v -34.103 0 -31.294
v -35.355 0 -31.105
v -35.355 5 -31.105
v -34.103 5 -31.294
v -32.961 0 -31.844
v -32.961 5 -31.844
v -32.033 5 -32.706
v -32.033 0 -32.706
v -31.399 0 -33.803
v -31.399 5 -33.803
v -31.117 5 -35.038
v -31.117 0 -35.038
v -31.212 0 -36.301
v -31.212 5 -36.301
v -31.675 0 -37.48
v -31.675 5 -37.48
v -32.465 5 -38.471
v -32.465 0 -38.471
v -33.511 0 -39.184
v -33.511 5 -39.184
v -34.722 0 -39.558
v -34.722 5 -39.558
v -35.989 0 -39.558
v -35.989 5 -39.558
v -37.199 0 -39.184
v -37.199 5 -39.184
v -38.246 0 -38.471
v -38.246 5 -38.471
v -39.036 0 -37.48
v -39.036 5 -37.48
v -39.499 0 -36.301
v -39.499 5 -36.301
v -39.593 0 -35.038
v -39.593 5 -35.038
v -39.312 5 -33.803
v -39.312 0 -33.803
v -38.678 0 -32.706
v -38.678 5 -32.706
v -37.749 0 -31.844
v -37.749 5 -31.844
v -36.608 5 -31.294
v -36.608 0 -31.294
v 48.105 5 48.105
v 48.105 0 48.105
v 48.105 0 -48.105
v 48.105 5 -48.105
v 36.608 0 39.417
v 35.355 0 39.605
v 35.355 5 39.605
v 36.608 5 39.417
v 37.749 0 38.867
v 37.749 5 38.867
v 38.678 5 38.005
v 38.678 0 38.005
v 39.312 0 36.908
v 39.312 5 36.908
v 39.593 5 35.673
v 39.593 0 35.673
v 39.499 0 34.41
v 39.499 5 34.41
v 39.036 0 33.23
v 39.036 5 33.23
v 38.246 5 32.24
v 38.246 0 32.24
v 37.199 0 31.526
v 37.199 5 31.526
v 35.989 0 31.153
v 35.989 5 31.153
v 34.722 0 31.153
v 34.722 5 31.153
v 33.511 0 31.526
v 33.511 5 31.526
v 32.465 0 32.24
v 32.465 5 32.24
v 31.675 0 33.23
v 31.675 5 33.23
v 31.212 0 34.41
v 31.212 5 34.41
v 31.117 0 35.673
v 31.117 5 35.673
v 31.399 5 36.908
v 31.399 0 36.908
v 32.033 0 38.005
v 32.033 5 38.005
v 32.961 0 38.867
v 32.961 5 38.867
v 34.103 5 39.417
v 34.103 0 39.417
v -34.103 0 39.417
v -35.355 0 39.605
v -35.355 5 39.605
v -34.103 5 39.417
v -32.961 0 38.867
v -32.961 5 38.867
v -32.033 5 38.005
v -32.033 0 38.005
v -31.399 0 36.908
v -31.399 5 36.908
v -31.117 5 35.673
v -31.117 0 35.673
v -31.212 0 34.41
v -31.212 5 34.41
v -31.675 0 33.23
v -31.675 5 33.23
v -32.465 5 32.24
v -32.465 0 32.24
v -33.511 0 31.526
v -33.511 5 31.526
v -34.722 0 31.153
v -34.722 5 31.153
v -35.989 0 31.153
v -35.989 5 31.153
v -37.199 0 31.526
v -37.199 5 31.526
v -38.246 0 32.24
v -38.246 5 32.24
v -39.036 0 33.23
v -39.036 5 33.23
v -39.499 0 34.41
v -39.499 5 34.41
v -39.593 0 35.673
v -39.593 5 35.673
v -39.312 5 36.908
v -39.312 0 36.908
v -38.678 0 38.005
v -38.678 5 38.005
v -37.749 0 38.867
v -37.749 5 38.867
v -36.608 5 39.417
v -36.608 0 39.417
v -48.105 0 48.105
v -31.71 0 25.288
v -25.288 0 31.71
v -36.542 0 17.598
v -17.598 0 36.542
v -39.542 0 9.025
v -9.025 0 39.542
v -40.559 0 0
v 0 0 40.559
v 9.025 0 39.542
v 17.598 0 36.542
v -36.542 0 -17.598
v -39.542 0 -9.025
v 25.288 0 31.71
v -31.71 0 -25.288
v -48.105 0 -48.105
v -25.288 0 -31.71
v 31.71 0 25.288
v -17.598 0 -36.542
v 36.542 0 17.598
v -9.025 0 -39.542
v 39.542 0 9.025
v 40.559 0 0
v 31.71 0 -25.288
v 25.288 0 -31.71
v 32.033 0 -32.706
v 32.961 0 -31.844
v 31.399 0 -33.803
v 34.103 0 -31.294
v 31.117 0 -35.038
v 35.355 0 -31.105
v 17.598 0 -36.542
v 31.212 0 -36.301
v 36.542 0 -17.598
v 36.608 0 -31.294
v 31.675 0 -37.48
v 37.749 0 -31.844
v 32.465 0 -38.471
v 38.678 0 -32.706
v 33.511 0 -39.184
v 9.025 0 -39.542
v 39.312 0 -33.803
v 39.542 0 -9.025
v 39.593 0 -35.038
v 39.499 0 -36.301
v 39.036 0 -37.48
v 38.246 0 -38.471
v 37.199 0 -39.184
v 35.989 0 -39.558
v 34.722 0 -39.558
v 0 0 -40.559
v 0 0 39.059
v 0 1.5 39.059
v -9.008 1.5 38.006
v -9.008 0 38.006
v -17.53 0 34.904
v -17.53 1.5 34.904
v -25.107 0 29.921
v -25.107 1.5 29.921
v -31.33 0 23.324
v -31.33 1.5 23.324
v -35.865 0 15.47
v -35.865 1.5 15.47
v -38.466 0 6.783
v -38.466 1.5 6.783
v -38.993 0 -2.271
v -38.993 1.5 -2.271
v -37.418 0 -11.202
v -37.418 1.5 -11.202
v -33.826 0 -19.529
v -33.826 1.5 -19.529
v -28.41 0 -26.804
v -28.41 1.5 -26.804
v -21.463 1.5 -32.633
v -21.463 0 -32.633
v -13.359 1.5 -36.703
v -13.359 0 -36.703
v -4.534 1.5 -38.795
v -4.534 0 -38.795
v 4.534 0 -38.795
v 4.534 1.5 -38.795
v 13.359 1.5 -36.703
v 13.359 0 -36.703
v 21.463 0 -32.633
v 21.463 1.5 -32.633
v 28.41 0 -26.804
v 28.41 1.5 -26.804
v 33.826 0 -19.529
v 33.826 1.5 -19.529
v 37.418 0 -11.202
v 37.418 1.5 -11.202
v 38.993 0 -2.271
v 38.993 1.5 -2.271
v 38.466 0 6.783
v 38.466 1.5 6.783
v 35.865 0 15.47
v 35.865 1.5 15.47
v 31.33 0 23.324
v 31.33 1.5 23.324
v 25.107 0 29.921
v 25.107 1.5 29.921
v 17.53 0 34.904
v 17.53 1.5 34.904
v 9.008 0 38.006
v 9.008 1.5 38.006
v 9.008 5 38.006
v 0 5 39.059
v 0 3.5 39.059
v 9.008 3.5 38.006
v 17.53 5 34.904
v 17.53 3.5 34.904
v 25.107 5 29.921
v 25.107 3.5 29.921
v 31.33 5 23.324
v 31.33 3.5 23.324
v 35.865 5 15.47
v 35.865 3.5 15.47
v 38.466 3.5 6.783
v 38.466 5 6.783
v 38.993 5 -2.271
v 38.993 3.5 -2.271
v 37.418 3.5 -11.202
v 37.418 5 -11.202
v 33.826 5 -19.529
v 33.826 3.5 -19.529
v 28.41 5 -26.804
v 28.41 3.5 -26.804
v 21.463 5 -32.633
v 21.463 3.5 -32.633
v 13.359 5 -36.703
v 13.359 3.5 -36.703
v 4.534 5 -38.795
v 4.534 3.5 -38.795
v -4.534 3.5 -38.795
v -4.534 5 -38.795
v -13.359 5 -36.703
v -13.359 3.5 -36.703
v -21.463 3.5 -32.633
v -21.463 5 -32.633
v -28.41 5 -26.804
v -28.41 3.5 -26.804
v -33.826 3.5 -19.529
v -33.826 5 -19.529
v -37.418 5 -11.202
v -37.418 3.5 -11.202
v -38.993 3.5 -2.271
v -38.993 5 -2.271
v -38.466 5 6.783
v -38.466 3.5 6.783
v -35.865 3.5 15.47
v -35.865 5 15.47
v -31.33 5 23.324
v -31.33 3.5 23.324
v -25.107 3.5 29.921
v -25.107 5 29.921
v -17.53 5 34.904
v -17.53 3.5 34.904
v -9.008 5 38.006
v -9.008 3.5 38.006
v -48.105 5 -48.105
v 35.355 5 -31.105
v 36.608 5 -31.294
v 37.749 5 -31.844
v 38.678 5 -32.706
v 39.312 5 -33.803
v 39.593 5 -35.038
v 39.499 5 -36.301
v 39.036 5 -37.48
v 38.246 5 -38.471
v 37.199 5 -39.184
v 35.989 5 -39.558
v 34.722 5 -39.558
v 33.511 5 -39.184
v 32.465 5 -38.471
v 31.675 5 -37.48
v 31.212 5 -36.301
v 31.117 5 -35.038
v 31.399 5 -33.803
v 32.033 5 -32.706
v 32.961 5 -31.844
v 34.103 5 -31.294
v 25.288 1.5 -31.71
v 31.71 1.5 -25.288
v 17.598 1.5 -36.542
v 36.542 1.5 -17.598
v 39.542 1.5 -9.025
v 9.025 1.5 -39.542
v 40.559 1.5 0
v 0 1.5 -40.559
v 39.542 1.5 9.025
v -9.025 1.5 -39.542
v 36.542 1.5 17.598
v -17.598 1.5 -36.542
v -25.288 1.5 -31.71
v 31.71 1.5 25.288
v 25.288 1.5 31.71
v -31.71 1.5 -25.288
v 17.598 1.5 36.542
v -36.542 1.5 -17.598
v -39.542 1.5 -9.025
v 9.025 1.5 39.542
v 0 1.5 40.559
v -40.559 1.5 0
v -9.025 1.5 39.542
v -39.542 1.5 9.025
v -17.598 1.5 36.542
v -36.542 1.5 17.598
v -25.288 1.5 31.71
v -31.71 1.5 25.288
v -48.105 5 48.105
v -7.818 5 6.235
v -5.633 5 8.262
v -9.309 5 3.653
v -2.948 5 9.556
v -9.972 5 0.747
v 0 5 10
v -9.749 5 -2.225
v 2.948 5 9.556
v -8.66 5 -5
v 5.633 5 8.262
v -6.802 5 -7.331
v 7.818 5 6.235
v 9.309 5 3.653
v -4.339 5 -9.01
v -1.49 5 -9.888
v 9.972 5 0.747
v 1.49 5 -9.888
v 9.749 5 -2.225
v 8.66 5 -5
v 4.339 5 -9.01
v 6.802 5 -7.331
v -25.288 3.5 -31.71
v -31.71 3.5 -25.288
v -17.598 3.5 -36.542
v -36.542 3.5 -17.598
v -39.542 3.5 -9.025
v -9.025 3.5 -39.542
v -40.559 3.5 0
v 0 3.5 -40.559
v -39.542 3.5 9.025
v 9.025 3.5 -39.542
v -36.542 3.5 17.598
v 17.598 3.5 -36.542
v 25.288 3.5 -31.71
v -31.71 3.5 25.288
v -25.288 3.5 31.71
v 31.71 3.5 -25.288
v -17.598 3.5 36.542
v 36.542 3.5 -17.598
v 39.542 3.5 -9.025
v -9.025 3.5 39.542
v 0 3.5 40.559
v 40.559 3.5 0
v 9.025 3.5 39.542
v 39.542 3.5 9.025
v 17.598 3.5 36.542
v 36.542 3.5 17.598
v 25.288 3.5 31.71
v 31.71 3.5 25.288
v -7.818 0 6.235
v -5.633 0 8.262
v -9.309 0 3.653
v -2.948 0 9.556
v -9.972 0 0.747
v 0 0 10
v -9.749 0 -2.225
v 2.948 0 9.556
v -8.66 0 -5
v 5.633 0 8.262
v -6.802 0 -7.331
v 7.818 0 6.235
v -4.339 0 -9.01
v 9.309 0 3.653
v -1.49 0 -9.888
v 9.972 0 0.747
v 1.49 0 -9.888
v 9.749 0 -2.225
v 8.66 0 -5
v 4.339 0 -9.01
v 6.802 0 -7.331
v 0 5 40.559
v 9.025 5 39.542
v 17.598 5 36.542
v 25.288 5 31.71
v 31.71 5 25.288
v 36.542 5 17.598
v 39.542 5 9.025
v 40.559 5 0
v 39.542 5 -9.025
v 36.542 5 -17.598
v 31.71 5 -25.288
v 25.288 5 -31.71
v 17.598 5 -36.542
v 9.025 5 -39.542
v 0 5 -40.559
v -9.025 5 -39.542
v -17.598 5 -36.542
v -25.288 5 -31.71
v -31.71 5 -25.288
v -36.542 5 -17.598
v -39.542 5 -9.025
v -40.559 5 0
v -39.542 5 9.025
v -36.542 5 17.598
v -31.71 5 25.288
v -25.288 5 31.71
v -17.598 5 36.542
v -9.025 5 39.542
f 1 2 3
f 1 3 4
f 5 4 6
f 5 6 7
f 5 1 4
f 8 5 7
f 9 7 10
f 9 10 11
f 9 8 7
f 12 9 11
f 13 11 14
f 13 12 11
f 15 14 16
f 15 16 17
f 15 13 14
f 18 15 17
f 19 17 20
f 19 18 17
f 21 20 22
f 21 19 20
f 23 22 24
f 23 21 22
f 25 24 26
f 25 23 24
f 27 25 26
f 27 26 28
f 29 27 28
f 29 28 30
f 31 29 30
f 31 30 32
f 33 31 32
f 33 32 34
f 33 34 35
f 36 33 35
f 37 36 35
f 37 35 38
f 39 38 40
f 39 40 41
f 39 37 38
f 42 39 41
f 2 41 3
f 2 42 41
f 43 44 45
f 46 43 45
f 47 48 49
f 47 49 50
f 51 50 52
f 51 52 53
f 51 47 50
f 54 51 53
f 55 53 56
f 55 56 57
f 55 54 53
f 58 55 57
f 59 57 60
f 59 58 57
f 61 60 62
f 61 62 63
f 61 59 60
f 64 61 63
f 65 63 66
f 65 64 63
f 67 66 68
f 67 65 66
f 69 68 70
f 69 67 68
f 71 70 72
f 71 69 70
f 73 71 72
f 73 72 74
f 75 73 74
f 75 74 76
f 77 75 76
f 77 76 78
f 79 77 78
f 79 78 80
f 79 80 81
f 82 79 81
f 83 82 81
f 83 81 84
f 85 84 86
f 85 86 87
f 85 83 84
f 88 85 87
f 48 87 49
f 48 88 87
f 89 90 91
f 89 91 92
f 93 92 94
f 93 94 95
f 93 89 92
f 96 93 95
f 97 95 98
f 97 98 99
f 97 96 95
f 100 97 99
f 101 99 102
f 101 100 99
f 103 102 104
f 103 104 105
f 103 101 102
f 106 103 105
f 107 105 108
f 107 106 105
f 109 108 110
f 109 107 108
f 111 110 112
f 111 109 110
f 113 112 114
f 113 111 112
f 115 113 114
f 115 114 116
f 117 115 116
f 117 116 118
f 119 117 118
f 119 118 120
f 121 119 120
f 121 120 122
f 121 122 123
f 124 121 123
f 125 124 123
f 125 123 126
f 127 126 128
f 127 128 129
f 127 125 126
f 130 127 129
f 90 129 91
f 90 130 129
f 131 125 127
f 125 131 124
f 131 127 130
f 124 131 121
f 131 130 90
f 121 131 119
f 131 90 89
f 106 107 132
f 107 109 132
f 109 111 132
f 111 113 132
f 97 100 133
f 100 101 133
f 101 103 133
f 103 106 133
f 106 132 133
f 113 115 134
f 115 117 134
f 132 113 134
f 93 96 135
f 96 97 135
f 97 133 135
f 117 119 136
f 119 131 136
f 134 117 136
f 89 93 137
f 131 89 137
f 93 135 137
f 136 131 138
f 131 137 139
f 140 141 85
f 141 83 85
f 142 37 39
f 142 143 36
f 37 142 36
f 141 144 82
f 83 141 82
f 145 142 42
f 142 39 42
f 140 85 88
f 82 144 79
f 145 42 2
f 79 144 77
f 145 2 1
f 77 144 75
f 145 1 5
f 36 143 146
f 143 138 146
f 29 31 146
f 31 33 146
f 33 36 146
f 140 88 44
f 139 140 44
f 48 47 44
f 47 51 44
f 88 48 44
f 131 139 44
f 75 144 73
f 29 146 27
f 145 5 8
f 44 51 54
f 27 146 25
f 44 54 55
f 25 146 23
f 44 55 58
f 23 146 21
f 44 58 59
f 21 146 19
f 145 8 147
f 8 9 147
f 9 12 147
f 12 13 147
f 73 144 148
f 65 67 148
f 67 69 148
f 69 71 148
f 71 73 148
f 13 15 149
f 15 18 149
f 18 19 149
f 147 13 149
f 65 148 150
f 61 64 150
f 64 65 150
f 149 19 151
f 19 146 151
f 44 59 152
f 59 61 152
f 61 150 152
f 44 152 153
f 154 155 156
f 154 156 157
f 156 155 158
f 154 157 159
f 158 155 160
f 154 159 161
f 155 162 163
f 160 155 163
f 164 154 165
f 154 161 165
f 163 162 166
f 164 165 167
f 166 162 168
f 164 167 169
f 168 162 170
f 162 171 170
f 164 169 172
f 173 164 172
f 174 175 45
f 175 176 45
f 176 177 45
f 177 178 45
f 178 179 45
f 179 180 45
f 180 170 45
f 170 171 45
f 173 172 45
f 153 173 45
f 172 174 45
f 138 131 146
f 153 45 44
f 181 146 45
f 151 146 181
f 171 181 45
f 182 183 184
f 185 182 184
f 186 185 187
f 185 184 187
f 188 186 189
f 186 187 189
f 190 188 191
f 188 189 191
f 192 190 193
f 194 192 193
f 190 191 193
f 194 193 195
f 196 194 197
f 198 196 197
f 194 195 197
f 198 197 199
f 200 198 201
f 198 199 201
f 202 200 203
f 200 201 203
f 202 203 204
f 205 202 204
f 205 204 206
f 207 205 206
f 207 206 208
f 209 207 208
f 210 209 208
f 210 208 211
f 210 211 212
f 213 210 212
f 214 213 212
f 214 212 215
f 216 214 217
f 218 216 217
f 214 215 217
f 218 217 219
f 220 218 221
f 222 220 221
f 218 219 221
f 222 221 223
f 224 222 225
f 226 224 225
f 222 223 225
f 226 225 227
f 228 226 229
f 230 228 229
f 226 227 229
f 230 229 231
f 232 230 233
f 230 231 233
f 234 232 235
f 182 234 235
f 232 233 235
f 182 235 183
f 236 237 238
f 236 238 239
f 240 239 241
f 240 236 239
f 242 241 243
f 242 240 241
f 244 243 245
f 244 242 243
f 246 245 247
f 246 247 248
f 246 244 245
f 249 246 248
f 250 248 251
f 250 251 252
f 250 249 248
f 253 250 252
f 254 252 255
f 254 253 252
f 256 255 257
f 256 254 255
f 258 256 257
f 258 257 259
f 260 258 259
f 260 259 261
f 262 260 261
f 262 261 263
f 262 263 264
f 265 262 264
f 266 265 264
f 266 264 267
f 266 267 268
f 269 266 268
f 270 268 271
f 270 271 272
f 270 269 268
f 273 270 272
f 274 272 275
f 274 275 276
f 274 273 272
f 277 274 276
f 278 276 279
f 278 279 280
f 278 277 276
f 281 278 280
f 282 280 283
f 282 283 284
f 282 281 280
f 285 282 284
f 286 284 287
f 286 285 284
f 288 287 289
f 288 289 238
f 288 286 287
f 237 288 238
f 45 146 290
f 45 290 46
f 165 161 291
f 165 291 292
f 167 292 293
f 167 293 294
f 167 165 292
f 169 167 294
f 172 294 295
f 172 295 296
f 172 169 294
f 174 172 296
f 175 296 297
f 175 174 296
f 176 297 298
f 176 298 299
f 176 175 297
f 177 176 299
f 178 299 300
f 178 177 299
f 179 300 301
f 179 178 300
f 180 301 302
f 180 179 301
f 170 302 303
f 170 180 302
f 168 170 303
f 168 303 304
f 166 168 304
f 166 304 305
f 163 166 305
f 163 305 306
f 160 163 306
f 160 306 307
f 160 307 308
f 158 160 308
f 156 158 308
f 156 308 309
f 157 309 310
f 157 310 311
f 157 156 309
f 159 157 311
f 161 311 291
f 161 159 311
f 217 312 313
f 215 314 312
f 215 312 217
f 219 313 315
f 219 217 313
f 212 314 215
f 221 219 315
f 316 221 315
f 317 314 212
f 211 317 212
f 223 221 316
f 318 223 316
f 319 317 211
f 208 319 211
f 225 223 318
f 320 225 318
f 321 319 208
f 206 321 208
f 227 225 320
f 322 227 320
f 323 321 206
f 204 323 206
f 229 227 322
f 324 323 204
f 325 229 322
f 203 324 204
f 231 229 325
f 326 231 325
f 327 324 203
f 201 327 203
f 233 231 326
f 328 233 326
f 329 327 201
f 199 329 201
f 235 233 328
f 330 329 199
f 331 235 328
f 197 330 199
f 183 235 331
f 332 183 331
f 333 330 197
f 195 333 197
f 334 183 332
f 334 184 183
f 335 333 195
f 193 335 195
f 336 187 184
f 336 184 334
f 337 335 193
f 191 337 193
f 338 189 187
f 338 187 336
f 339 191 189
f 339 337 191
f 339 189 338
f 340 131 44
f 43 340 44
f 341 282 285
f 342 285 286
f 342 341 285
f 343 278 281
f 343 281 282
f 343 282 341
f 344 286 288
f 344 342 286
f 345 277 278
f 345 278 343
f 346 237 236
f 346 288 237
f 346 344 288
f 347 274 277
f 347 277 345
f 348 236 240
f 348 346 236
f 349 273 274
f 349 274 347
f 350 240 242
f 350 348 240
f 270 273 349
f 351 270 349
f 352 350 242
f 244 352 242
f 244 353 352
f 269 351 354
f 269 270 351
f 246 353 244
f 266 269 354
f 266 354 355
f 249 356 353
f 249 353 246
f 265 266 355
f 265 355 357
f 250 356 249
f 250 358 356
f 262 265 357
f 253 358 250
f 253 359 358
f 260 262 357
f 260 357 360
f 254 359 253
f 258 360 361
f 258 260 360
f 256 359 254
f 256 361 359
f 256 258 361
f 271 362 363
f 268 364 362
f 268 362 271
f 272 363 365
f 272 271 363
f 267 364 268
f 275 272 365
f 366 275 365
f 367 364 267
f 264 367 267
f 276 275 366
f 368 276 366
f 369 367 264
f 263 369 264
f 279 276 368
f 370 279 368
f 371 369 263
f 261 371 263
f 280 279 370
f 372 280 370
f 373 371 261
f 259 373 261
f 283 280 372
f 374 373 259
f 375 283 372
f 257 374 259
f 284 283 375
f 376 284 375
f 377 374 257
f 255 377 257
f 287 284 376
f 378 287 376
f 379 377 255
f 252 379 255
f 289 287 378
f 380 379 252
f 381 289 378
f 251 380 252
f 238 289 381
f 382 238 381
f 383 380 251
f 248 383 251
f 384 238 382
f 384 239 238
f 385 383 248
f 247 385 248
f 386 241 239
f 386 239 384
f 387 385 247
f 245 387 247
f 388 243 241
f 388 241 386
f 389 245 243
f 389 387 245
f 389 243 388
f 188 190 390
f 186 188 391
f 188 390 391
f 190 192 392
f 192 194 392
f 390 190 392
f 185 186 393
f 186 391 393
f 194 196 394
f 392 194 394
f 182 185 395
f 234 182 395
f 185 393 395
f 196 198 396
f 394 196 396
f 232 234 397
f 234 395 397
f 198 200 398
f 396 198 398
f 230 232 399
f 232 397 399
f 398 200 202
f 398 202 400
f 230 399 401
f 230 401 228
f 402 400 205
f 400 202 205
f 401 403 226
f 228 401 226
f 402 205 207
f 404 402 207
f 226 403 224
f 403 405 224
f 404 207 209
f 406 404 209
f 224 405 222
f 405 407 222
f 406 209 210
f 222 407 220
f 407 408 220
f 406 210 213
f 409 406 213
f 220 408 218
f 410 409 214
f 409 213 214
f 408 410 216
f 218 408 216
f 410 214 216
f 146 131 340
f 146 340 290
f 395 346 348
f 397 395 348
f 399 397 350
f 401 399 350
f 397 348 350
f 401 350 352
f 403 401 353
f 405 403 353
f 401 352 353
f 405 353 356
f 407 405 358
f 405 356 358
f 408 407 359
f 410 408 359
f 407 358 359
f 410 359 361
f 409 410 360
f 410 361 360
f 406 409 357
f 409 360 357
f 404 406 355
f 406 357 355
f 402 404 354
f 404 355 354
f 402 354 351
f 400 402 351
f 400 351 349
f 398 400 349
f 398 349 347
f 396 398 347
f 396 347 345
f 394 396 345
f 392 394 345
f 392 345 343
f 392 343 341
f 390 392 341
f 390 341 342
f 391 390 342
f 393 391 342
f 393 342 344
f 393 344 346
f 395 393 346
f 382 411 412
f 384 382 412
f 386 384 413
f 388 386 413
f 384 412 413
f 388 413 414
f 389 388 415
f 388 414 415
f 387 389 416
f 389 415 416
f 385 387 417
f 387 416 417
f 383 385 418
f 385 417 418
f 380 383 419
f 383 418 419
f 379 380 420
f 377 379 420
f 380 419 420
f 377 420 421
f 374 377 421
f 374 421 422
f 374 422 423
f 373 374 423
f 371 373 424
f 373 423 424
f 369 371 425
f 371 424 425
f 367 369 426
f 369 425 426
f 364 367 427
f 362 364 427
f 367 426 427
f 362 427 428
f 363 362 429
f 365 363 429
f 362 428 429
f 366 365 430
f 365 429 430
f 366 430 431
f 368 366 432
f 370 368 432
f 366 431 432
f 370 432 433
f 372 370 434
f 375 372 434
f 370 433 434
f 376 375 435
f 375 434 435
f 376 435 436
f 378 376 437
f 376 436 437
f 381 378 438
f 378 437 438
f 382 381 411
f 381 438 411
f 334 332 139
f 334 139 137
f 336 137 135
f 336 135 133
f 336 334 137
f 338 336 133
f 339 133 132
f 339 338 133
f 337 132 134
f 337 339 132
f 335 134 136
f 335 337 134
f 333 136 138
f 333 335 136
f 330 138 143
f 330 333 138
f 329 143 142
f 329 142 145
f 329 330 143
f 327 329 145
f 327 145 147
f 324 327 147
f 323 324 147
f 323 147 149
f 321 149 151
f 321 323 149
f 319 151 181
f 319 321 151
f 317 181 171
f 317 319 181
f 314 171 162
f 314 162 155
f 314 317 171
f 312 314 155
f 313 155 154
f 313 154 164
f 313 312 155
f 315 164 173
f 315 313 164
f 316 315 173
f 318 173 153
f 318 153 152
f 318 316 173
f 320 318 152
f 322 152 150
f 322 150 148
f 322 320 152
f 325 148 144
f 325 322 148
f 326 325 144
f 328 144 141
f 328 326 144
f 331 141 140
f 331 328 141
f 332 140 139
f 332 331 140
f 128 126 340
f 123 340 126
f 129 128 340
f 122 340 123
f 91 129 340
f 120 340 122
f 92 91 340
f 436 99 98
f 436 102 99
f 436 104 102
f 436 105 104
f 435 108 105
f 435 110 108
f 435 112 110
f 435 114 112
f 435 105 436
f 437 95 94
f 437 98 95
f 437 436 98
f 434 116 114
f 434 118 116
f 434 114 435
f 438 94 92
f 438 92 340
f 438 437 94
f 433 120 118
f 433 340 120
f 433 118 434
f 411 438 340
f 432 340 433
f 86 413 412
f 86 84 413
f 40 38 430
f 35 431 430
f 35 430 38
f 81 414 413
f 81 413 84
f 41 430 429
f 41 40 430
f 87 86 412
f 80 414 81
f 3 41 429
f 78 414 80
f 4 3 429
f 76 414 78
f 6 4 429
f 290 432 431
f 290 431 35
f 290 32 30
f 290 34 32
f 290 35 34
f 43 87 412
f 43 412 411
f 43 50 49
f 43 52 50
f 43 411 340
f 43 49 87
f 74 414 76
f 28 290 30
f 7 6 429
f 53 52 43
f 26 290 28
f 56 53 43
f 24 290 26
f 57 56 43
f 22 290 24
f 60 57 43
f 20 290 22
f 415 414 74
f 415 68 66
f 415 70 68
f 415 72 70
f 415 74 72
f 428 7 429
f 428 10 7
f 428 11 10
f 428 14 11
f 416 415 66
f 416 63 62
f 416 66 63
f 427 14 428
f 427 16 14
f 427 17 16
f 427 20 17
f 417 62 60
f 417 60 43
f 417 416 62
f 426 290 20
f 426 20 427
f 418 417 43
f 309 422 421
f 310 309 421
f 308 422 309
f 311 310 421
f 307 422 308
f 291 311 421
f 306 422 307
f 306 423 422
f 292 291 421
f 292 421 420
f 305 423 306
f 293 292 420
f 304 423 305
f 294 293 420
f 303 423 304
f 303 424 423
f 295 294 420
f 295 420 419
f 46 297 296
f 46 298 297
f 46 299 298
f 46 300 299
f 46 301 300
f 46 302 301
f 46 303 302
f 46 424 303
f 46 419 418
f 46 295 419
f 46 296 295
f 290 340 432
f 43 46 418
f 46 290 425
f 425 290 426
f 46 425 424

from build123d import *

# Parameters (mm, degrees)
SKETCH1_W                           = 96.210678118
SKETCH1_H                           = 96.210678118
SKETCH1_R                           = 4.25
BODY_EXTRUSION_AND_BOLT_HOLES_DEPTH = 5
SKETCH3_R                           = 10
CENTER_BORE_DEPTH                   = 22.5
SKETCH4_R                           = 40.558917197
SKETCH4_R_2                         = 39.058917197
O_RING_GROOVE_DEPTH                 = 1.5
CUT_EXTRUDE2_START                  = -1.5
SKETCH6_R                           = 40.558917197
SKETCH6_R_2                         = 39.058917197
CUT_EXTRUDE2_DEPTH                  = 1.5


with BuildPart() as part:
    # Sketch1 → body extrusion and bolt holes (new body)
    with BuildSketch(Plane(origin=(0, 0, 0), x_dir=(1, 0, 0), z_dir=(0, 1, 0))):
        Rectangle(SKETCH1_W, SKETCH1_H)
        with Locations(Location((-35.355339059, 35.355339059, 0), (0, 0, 270))):
            Circle(SKETCH1_R, mode=Mode.SUBTRACT)
        with Locations(Location((35.355339059, 35.355339059, 0), (0, 0, 270))):
            Circle(SKETCH1_R, mode=Mode.SUBTRACT)
        with Locations(Location((35.355339059, -35.355339059, 0), (0, 0, 270))):
            Circle(SKETCH1_R, mode=Mode.SUBTRACT)
        with Locations(Location((-35.355339059, -35.355339059, 0), (0, 0, 270))):
            Circle(SKETCH1_R, mode=Mode.SUBTRACT)
    extrude(amount=BODY_EXTRUSION_AND_BOLT_HOLES_DEPTH)

    # Sketch3 → center bore (cut)
    with BuildSketch(Plane(origin=(0, 5, 0), x_dir=(1, 0, 0), z_dir=(0, 1, 0))):
        with Locations(Location((0, 0, 0), (0, 0, 270))):
            Circle(SKETCH3_R)
    extrude(amount=-CENTER_BORE_DEPTH, mode=Mode.SUBTRACT)

    # Sketch4 → o-ring groove (cut)
    with BuildSketch(Plane(origin=(0, 5, 0), x_dir=(1, 0, 0), z_dir=(0, 1, 0))):
        with Locations(Location((0, 0, 0), (0, 0, 270))):
            Circle(SKETCH4_R)
        with Locations(Location((0, 0, 0), (0, 0, 270))):
            Circle(SKETCH4_R_2, mode=Mode.SUBTRACT)
    extrude(amount=-O_RING_GROOVE_DEPTH, mode=Mode.SUBTRACT)

    # Sketch6 → Cut-Extrude2 (cut)
    with BuildSketch(Plane.XZ.offset(CUT_EXTRUDE2_START)):
        with Locations(Location((0, 0, 0), (0, 0, 90))):
            Circle(SKETCH6_R)
        with Locations(Location((0, 0, 0), (0, 0, 90))):
            Circle(SKETCH6_R_2, mode=Mode.SUBTRACT)
    extrude(amount=CUT_EXTRUDE2_DEPTH, mode=Mode.SUBTRACT)


solid = part.part
